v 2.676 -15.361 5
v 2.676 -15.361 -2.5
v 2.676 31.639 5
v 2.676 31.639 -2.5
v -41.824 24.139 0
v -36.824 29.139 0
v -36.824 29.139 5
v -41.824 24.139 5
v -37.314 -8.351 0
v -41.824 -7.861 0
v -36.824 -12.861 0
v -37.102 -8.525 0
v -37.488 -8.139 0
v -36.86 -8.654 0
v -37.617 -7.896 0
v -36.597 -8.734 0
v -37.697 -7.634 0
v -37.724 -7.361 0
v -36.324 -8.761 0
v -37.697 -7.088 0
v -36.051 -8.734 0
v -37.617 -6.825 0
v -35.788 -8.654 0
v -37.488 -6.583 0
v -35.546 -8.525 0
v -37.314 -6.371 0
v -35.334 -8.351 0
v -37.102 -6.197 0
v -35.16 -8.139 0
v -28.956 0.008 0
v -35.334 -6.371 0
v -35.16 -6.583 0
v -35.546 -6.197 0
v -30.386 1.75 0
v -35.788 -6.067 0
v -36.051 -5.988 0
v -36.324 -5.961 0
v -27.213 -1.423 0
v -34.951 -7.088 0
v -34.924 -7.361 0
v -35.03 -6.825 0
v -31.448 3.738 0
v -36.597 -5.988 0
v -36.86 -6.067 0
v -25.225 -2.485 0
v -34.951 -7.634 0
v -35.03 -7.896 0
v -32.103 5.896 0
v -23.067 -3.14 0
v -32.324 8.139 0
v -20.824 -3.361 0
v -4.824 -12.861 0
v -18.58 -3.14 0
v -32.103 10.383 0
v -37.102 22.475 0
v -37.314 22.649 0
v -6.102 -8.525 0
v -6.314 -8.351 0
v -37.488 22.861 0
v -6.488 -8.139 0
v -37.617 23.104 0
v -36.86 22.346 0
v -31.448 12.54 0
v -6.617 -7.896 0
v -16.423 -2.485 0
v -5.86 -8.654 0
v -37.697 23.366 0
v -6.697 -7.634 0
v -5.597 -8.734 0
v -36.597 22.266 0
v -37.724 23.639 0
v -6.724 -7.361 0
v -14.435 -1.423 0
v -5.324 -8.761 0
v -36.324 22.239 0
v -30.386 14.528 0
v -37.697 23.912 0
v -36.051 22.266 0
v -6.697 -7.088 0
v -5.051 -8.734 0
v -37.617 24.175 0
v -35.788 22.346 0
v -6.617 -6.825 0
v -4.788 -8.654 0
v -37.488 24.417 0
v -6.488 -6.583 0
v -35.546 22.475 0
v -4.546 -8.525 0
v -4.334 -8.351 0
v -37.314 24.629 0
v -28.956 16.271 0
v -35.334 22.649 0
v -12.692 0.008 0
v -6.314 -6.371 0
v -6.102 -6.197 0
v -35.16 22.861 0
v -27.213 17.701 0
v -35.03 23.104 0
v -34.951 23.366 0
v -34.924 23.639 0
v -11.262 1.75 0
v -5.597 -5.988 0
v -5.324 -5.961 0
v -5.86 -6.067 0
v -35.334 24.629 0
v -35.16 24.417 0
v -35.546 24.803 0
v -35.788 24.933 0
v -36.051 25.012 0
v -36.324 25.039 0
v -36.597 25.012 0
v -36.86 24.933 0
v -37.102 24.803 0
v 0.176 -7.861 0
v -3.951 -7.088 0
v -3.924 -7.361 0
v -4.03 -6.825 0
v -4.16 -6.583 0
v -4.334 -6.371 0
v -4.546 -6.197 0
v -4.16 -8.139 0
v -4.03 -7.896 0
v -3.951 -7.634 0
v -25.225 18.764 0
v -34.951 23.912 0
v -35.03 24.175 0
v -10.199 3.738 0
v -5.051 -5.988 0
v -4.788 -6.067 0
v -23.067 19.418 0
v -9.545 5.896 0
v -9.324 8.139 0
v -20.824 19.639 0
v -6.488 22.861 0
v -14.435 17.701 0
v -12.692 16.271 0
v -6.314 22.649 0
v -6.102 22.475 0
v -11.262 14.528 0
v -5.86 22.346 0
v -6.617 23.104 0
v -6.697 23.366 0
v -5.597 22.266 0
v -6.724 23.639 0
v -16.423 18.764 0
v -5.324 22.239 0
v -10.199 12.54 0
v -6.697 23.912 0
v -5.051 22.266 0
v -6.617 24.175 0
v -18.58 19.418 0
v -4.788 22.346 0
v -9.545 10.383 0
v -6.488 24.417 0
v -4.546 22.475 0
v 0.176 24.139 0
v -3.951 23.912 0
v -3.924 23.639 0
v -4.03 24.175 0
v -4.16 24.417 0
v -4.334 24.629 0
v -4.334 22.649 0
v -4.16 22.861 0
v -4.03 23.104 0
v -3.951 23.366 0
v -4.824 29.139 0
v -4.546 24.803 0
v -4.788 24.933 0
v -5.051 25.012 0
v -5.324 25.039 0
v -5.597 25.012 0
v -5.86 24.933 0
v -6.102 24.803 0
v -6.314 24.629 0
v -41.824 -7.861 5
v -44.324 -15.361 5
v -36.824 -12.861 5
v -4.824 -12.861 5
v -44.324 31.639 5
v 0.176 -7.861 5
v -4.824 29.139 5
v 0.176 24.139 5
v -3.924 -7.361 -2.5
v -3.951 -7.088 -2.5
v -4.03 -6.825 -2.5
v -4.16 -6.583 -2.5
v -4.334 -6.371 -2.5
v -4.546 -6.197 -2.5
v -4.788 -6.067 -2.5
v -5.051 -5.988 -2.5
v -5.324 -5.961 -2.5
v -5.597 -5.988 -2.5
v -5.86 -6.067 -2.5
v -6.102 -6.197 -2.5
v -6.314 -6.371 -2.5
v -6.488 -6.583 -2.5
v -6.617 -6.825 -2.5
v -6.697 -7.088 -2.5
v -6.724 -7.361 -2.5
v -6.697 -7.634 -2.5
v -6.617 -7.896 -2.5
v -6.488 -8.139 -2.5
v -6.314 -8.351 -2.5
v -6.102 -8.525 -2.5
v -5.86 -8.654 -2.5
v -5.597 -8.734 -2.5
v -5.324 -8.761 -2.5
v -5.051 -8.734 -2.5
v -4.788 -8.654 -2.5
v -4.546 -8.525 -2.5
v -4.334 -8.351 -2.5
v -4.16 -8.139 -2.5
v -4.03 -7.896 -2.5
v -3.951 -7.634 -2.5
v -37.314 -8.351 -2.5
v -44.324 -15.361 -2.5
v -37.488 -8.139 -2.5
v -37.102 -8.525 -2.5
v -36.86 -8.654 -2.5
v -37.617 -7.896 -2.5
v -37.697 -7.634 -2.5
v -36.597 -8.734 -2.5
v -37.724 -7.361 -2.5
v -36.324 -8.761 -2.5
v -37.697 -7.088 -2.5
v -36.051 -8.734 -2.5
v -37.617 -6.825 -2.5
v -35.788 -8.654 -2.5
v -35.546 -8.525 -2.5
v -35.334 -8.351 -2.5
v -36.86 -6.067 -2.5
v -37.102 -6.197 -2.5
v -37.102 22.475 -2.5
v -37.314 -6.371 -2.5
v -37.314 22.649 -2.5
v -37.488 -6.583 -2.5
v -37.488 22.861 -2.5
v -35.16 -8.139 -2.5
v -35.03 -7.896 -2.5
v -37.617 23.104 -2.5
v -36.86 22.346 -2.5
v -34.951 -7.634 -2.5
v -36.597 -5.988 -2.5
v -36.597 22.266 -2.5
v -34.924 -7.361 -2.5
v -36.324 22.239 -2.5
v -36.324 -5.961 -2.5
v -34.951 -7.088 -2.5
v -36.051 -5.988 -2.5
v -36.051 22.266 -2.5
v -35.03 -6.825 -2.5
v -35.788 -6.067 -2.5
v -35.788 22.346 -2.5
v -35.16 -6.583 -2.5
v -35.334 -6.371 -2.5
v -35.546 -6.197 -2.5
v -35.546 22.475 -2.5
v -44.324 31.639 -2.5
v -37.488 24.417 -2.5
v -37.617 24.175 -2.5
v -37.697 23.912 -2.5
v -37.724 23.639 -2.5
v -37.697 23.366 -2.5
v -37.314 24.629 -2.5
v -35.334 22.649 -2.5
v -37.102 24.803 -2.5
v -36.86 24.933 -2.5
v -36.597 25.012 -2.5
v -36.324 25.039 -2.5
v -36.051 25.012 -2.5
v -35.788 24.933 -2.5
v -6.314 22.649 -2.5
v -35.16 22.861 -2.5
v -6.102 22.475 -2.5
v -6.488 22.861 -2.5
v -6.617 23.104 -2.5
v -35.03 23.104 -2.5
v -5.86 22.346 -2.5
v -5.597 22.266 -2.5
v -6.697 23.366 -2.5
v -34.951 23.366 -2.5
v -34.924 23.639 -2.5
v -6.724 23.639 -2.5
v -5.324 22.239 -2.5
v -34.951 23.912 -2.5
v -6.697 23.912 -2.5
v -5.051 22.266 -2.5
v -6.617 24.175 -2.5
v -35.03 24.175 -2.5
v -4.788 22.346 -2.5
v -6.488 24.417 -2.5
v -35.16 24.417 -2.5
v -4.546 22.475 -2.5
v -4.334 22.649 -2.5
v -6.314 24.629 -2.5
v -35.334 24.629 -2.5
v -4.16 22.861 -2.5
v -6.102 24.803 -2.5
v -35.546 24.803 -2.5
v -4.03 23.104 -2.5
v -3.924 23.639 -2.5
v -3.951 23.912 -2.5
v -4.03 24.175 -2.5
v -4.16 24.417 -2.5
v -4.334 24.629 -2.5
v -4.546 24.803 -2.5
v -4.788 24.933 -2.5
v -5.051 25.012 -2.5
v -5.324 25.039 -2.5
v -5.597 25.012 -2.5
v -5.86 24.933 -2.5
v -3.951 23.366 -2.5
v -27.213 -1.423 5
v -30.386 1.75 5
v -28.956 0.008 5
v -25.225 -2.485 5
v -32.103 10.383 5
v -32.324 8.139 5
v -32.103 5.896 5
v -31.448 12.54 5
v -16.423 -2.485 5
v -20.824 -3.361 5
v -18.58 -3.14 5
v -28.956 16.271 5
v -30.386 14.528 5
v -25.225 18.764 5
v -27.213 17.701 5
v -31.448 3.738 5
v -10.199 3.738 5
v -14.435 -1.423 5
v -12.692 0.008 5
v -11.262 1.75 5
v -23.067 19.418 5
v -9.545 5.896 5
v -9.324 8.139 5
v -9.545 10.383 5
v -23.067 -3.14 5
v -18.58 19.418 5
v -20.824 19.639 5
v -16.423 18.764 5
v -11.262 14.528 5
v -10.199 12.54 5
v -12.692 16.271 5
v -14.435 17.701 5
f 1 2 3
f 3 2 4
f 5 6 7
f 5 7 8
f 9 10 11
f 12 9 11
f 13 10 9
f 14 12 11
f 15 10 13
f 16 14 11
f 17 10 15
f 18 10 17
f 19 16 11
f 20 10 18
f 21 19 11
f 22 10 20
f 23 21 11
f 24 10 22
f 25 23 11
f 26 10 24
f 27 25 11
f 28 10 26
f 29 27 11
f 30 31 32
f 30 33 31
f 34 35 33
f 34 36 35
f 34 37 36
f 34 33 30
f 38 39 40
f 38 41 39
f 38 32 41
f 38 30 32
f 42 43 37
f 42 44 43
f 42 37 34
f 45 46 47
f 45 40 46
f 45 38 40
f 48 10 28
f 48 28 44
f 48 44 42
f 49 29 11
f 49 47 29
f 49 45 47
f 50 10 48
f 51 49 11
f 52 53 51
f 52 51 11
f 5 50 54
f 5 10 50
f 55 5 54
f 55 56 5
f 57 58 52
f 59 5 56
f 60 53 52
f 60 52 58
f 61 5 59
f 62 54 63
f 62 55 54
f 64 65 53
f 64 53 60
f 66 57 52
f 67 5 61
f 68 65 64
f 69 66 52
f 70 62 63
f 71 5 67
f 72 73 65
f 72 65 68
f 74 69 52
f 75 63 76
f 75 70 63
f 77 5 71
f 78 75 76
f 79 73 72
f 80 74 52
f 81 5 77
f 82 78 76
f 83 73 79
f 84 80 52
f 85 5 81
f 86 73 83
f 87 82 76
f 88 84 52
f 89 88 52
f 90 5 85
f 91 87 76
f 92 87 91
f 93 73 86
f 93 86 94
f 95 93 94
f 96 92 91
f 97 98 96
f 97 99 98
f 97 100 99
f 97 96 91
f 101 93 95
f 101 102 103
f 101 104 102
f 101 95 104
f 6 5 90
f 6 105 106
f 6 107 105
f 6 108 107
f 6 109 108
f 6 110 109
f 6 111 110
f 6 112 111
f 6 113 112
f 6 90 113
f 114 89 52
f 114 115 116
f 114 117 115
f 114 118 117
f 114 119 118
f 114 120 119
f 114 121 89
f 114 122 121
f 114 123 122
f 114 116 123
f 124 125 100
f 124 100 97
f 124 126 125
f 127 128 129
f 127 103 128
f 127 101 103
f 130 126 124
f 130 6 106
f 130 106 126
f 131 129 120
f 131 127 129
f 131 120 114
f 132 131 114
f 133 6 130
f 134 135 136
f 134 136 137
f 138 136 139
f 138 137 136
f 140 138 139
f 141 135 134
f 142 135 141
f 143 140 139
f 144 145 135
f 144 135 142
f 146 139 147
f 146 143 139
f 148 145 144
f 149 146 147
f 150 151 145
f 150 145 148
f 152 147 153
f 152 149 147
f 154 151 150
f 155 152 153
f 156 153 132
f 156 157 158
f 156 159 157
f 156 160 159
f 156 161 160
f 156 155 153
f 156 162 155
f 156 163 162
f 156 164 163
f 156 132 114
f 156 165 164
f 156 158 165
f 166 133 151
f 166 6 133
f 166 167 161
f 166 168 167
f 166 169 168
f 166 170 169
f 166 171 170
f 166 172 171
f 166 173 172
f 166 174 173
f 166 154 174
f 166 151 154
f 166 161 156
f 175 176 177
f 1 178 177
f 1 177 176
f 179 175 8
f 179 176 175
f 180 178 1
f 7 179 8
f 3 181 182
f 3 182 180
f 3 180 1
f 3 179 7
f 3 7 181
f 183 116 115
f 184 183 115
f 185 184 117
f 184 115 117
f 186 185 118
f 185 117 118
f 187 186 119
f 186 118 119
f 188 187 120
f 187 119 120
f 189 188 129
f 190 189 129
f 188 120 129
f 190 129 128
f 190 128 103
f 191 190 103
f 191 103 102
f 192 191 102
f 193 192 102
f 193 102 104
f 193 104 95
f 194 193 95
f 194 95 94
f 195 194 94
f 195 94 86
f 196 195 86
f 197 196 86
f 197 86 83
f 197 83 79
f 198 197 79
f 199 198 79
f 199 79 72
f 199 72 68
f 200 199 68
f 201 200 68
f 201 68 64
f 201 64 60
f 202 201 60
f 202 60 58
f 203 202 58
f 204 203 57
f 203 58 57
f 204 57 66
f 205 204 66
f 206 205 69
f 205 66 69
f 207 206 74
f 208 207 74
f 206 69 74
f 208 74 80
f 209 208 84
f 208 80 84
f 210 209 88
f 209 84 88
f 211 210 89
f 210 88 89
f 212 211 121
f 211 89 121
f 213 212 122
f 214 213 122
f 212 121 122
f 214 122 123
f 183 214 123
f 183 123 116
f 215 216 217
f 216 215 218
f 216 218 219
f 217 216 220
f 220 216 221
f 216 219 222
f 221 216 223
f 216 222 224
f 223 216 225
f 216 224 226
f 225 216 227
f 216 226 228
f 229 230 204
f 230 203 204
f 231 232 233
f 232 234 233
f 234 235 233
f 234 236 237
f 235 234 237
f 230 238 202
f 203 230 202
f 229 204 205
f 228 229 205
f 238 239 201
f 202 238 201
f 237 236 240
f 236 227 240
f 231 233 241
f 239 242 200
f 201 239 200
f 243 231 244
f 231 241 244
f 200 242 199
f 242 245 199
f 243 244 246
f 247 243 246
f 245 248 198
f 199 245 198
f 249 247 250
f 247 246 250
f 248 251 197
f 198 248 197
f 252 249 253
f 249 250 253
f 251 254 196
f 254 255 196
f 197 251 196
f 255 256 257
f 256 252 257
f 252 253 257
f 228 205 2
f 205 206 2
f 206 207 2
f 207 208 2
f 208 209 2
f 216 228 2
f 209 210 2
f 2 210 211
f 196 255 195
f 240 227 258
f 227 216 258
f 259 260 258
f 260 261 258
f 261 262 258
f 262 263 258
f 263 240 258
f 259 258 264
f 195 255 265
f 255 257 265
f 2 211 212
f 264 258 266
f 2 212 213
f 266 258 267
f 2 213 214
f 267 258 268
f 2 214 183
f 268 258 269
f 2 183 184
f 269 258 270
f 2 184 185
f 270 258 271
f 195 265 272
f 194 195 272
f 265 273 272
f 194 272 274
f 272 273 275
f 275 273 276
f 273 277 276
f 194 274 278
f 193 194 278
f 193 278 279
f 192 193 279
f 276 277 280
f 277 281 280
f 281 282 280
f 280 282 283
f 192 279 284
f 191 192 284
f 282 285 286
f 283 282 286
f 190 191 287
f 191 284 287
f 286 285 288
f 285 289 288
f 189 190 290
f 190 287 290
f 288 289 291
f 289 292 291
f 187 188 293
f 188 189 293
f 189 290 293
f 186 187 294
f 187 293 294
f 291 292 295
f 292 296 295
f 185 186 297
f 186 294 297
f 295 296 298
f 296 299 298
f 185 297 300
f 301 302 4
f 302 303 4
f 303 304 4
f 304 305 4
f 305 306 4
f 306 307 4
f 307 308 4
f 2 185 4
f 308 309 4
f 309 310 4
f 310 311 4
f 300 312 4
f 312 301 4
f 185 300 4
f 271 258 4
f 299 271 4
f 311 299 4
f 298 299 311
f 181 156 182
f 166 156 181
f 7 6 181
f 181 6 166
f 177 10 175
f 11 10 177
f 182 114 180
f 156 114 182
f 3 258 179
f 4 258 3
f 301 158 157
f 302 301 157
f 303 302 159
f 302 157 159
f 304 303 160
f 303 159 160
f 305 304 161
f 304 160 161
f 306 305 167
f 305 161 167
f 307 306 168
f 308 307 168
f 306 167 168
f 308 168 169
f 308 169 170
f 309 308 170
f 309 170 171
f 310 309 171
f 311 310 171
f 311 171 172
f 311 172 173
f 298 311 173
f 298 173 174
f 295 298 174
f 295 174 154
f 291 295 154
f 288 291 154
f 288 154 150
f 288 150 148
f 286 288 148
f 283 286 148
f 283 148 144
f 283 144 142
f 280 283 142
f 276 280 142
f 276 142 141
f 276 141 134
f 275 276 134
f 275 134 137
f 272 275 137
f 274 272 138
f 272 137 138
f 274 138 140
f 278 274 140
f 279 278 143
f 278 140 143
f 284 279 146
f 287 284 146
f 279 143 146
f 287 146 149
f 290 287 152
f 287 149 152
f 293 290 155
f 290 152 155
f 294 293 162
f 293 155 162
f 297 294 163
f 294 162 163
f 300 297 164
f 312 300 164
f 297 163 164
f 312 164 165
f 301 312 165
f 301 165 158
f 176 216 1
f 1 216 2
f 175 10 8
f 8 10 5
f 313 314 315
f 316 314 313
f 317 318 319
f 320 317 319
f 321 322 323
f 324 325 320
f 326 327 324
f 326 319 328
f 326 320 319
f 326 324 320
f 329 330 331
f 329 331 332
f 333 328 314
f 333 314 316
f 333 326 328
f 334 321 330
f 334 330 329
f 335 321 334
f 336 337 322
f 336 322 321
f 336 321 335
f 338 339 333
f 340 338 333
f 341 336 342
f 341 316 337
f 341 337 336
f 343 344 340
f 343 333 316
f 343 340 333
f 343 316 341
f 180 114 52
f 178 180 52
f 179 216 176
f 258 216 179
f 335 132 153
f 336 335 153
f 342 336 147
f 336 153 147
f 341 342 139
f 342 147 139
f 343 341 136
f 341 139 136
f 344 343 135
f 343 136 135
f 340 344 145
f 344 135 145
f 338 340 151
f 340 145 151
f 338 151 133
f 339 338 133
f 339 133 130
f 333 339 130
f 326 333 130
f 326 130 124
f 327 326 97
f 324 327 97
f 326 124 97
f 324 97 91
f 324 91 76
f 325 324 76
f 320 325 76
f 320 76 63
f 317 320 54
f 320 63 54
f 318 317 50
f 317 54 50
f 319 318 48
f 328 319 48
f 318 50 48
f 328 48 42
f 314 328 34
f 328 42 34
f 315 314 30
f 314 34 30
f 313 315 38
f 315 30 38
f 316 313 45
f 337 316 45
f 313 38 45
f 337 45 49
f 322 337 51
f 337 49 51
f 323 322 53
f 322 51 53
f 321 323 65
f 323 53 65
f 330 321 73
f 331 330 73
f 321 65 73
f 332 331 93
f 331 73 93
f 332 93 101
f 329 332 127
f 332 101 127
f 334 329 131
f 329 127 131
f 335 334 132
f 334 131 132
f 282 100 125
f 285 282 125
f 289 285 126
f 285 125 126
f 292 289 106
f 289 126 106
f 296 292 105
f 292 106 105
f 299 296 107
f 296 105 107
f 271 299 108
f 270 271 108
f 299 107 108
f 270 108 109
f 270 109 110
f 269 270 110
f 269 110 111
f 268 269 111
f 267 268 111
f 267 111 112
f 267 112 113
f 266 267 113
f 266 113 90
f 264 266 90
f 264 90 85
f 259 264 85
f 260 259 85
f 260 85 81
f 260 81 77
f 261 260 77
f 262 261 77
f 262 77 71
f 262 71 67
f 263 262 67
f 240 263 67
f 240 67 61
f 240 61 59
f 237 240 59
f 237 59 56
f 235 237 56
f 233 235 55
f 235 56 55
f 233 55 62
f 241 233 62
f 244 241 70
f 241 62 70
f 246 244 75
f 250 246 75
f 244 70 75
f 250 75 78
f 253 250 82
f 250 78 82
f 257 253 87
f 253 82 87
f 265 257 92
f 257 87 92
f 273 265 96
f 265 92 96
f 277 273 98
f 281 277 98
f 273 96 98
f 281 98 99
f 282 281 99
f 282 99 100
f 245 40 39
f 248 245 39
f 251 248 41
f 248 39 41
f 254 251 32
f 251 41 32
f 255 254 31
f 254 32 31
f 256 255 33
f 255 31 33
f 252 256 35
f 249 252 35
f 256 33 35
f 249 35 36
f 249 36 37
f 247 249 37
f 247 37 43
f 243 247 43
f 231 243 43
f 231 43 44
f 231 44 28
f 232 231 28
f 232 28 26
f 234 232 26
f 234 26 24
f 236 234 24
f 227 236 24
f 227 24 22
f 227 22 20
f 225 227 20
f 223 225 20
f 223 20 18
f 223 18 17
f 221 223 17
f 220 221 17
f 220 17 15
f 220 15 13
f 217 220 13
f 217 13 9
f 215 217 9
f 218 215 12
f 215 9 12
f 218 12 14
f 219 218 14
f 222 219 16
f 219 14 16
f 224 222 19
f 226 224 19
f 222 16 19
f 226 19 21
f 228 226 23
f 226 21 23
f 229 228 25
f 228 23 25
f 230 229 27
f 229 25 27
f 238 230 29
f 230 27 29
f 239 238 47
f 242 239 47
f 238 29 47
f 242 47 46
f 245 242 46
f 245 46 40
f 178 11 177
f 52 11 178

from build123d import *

# Parameters (mm, degrees)
F0_W        = 42
F0_H        = 42
F0_R        = 1.4
F0_R_2      = 11.5
F1_DEPTH    = 5
F2_T        = 2.5
F3_T1_DEPTH = 5
F4_DEPTH    = 5
F5_DEPTH    = 25


# Not quite as in the source:
# - a fillet or chamfer that OpenCascade refuses, or shapes differently, is made with other operations: its cross-section is extruded or revolved along the edge and cut away or added


with BuildPart() as f1:
    # F0 (on Top) → F1 (new body)
    with BuildSketch(Plane.XY):
        with Locations((-20.8238260887, 8.1392613277)):
            Rectangle(F0_W, F0_H)
        with Locations((-36.3238260887, -7.3607386723)):
            Circle(F0_R, mode=Mode.SUBTRACT)
        with Locations((-5.3238260887, -7.3607386723)):
            Circle(F0_R, mode=Mode.SUBTRACT)
        with Locations((-36.3238260887, 23.6392613277)):
            Circle(F0_R, mode=Mode.SUBTRACT)
        with Locations((-20.8238260887, 8.1392613277)):
            Circle(F0_R_2, mode=Mode.SUBTRACT)
        with Locations((-5.3238260887, 23.6392613277)):
            Circle(F0_R, mode=Mode.SUBTRACT)
        with Locations((-20.8238260887, 8.1392613277)):
            Circle(F0_R_2)
        with Locations((-36.3238260887, 23.6392613277)):
            Circle(F0_R)
        with Locations((-5.3238260887, 23.6392613277)):
            Circle(F0_R)
        with Locations((-5.3238260887, -7.3607386723)):
            Circle(F0_R)
        with Locations((-36.3238260887, -7.3607386723)):
            Circle(F0_R)
    extrude(amount=F1_DEPTH)

    # F2
    f2_openings = [f1.faces().sort_by_distance(p)[0] for p in [
        (-20.823826, 8.139261, 5),
    ]]
    offset(amount=F2_T, openings=f2_openings, kind=Kind.INTERSECTION)

    # F3: chamfer of 5 on 4 edges, made by hand

    # F3_s2 → F3_t1 (join)
    with BuildSketch(Plane.XY):
        Polygon((0.1761739113, -7.8607386723), (-4.8238260887, -12.8607386723), (0.1761739113, -12.8607386723), align=None)
        Polygon((0.1761739113, 24.1392613277), (-4.8238260887, 29.1392613277), (0.1761739113, 29.1392613277), align=None)
        Polygon((-36.8238260887, 29.1392613277), (-41.8238260887, 24.1392613277), (-41.8238260887, 29.1392613277), align=None)
        Polygon((-41.8238260887, -7.8607386723), (-36.8238260887, -12.8607386723), (-41.8238260887, -12.8607386723), align=None)
    extrude(amount=F3_T1_DEPTH)

    # F0 (on Top) → F4 (join)
    with BuildSketch(Plane.XY):
        with Locations((-20.8238260887, 8.1392613277)):
            Circle(F0_R_2)
    extrude(amount=F4_DEPTH)

    # F0 (on Top) → F5 (cut)
    with BuildSketch(Plane.XY):
        with Locations((-36.3238260887, -7.3607386723)):
            Circle(F0_R)
        with Locations((-36.3238260887, 23.6392613277)):
            Circle(F0_R)
        with Locations((-5.3238260887, 23.6392613277)):
            Circle(F0_R)
        with Locations((-5.3238260887, -7.3607386723)):
            Circle(F0_R)
    extrude(amount=-F5_DEPTH, mode=Mode.SUBTRACT)


solid = f1.part
